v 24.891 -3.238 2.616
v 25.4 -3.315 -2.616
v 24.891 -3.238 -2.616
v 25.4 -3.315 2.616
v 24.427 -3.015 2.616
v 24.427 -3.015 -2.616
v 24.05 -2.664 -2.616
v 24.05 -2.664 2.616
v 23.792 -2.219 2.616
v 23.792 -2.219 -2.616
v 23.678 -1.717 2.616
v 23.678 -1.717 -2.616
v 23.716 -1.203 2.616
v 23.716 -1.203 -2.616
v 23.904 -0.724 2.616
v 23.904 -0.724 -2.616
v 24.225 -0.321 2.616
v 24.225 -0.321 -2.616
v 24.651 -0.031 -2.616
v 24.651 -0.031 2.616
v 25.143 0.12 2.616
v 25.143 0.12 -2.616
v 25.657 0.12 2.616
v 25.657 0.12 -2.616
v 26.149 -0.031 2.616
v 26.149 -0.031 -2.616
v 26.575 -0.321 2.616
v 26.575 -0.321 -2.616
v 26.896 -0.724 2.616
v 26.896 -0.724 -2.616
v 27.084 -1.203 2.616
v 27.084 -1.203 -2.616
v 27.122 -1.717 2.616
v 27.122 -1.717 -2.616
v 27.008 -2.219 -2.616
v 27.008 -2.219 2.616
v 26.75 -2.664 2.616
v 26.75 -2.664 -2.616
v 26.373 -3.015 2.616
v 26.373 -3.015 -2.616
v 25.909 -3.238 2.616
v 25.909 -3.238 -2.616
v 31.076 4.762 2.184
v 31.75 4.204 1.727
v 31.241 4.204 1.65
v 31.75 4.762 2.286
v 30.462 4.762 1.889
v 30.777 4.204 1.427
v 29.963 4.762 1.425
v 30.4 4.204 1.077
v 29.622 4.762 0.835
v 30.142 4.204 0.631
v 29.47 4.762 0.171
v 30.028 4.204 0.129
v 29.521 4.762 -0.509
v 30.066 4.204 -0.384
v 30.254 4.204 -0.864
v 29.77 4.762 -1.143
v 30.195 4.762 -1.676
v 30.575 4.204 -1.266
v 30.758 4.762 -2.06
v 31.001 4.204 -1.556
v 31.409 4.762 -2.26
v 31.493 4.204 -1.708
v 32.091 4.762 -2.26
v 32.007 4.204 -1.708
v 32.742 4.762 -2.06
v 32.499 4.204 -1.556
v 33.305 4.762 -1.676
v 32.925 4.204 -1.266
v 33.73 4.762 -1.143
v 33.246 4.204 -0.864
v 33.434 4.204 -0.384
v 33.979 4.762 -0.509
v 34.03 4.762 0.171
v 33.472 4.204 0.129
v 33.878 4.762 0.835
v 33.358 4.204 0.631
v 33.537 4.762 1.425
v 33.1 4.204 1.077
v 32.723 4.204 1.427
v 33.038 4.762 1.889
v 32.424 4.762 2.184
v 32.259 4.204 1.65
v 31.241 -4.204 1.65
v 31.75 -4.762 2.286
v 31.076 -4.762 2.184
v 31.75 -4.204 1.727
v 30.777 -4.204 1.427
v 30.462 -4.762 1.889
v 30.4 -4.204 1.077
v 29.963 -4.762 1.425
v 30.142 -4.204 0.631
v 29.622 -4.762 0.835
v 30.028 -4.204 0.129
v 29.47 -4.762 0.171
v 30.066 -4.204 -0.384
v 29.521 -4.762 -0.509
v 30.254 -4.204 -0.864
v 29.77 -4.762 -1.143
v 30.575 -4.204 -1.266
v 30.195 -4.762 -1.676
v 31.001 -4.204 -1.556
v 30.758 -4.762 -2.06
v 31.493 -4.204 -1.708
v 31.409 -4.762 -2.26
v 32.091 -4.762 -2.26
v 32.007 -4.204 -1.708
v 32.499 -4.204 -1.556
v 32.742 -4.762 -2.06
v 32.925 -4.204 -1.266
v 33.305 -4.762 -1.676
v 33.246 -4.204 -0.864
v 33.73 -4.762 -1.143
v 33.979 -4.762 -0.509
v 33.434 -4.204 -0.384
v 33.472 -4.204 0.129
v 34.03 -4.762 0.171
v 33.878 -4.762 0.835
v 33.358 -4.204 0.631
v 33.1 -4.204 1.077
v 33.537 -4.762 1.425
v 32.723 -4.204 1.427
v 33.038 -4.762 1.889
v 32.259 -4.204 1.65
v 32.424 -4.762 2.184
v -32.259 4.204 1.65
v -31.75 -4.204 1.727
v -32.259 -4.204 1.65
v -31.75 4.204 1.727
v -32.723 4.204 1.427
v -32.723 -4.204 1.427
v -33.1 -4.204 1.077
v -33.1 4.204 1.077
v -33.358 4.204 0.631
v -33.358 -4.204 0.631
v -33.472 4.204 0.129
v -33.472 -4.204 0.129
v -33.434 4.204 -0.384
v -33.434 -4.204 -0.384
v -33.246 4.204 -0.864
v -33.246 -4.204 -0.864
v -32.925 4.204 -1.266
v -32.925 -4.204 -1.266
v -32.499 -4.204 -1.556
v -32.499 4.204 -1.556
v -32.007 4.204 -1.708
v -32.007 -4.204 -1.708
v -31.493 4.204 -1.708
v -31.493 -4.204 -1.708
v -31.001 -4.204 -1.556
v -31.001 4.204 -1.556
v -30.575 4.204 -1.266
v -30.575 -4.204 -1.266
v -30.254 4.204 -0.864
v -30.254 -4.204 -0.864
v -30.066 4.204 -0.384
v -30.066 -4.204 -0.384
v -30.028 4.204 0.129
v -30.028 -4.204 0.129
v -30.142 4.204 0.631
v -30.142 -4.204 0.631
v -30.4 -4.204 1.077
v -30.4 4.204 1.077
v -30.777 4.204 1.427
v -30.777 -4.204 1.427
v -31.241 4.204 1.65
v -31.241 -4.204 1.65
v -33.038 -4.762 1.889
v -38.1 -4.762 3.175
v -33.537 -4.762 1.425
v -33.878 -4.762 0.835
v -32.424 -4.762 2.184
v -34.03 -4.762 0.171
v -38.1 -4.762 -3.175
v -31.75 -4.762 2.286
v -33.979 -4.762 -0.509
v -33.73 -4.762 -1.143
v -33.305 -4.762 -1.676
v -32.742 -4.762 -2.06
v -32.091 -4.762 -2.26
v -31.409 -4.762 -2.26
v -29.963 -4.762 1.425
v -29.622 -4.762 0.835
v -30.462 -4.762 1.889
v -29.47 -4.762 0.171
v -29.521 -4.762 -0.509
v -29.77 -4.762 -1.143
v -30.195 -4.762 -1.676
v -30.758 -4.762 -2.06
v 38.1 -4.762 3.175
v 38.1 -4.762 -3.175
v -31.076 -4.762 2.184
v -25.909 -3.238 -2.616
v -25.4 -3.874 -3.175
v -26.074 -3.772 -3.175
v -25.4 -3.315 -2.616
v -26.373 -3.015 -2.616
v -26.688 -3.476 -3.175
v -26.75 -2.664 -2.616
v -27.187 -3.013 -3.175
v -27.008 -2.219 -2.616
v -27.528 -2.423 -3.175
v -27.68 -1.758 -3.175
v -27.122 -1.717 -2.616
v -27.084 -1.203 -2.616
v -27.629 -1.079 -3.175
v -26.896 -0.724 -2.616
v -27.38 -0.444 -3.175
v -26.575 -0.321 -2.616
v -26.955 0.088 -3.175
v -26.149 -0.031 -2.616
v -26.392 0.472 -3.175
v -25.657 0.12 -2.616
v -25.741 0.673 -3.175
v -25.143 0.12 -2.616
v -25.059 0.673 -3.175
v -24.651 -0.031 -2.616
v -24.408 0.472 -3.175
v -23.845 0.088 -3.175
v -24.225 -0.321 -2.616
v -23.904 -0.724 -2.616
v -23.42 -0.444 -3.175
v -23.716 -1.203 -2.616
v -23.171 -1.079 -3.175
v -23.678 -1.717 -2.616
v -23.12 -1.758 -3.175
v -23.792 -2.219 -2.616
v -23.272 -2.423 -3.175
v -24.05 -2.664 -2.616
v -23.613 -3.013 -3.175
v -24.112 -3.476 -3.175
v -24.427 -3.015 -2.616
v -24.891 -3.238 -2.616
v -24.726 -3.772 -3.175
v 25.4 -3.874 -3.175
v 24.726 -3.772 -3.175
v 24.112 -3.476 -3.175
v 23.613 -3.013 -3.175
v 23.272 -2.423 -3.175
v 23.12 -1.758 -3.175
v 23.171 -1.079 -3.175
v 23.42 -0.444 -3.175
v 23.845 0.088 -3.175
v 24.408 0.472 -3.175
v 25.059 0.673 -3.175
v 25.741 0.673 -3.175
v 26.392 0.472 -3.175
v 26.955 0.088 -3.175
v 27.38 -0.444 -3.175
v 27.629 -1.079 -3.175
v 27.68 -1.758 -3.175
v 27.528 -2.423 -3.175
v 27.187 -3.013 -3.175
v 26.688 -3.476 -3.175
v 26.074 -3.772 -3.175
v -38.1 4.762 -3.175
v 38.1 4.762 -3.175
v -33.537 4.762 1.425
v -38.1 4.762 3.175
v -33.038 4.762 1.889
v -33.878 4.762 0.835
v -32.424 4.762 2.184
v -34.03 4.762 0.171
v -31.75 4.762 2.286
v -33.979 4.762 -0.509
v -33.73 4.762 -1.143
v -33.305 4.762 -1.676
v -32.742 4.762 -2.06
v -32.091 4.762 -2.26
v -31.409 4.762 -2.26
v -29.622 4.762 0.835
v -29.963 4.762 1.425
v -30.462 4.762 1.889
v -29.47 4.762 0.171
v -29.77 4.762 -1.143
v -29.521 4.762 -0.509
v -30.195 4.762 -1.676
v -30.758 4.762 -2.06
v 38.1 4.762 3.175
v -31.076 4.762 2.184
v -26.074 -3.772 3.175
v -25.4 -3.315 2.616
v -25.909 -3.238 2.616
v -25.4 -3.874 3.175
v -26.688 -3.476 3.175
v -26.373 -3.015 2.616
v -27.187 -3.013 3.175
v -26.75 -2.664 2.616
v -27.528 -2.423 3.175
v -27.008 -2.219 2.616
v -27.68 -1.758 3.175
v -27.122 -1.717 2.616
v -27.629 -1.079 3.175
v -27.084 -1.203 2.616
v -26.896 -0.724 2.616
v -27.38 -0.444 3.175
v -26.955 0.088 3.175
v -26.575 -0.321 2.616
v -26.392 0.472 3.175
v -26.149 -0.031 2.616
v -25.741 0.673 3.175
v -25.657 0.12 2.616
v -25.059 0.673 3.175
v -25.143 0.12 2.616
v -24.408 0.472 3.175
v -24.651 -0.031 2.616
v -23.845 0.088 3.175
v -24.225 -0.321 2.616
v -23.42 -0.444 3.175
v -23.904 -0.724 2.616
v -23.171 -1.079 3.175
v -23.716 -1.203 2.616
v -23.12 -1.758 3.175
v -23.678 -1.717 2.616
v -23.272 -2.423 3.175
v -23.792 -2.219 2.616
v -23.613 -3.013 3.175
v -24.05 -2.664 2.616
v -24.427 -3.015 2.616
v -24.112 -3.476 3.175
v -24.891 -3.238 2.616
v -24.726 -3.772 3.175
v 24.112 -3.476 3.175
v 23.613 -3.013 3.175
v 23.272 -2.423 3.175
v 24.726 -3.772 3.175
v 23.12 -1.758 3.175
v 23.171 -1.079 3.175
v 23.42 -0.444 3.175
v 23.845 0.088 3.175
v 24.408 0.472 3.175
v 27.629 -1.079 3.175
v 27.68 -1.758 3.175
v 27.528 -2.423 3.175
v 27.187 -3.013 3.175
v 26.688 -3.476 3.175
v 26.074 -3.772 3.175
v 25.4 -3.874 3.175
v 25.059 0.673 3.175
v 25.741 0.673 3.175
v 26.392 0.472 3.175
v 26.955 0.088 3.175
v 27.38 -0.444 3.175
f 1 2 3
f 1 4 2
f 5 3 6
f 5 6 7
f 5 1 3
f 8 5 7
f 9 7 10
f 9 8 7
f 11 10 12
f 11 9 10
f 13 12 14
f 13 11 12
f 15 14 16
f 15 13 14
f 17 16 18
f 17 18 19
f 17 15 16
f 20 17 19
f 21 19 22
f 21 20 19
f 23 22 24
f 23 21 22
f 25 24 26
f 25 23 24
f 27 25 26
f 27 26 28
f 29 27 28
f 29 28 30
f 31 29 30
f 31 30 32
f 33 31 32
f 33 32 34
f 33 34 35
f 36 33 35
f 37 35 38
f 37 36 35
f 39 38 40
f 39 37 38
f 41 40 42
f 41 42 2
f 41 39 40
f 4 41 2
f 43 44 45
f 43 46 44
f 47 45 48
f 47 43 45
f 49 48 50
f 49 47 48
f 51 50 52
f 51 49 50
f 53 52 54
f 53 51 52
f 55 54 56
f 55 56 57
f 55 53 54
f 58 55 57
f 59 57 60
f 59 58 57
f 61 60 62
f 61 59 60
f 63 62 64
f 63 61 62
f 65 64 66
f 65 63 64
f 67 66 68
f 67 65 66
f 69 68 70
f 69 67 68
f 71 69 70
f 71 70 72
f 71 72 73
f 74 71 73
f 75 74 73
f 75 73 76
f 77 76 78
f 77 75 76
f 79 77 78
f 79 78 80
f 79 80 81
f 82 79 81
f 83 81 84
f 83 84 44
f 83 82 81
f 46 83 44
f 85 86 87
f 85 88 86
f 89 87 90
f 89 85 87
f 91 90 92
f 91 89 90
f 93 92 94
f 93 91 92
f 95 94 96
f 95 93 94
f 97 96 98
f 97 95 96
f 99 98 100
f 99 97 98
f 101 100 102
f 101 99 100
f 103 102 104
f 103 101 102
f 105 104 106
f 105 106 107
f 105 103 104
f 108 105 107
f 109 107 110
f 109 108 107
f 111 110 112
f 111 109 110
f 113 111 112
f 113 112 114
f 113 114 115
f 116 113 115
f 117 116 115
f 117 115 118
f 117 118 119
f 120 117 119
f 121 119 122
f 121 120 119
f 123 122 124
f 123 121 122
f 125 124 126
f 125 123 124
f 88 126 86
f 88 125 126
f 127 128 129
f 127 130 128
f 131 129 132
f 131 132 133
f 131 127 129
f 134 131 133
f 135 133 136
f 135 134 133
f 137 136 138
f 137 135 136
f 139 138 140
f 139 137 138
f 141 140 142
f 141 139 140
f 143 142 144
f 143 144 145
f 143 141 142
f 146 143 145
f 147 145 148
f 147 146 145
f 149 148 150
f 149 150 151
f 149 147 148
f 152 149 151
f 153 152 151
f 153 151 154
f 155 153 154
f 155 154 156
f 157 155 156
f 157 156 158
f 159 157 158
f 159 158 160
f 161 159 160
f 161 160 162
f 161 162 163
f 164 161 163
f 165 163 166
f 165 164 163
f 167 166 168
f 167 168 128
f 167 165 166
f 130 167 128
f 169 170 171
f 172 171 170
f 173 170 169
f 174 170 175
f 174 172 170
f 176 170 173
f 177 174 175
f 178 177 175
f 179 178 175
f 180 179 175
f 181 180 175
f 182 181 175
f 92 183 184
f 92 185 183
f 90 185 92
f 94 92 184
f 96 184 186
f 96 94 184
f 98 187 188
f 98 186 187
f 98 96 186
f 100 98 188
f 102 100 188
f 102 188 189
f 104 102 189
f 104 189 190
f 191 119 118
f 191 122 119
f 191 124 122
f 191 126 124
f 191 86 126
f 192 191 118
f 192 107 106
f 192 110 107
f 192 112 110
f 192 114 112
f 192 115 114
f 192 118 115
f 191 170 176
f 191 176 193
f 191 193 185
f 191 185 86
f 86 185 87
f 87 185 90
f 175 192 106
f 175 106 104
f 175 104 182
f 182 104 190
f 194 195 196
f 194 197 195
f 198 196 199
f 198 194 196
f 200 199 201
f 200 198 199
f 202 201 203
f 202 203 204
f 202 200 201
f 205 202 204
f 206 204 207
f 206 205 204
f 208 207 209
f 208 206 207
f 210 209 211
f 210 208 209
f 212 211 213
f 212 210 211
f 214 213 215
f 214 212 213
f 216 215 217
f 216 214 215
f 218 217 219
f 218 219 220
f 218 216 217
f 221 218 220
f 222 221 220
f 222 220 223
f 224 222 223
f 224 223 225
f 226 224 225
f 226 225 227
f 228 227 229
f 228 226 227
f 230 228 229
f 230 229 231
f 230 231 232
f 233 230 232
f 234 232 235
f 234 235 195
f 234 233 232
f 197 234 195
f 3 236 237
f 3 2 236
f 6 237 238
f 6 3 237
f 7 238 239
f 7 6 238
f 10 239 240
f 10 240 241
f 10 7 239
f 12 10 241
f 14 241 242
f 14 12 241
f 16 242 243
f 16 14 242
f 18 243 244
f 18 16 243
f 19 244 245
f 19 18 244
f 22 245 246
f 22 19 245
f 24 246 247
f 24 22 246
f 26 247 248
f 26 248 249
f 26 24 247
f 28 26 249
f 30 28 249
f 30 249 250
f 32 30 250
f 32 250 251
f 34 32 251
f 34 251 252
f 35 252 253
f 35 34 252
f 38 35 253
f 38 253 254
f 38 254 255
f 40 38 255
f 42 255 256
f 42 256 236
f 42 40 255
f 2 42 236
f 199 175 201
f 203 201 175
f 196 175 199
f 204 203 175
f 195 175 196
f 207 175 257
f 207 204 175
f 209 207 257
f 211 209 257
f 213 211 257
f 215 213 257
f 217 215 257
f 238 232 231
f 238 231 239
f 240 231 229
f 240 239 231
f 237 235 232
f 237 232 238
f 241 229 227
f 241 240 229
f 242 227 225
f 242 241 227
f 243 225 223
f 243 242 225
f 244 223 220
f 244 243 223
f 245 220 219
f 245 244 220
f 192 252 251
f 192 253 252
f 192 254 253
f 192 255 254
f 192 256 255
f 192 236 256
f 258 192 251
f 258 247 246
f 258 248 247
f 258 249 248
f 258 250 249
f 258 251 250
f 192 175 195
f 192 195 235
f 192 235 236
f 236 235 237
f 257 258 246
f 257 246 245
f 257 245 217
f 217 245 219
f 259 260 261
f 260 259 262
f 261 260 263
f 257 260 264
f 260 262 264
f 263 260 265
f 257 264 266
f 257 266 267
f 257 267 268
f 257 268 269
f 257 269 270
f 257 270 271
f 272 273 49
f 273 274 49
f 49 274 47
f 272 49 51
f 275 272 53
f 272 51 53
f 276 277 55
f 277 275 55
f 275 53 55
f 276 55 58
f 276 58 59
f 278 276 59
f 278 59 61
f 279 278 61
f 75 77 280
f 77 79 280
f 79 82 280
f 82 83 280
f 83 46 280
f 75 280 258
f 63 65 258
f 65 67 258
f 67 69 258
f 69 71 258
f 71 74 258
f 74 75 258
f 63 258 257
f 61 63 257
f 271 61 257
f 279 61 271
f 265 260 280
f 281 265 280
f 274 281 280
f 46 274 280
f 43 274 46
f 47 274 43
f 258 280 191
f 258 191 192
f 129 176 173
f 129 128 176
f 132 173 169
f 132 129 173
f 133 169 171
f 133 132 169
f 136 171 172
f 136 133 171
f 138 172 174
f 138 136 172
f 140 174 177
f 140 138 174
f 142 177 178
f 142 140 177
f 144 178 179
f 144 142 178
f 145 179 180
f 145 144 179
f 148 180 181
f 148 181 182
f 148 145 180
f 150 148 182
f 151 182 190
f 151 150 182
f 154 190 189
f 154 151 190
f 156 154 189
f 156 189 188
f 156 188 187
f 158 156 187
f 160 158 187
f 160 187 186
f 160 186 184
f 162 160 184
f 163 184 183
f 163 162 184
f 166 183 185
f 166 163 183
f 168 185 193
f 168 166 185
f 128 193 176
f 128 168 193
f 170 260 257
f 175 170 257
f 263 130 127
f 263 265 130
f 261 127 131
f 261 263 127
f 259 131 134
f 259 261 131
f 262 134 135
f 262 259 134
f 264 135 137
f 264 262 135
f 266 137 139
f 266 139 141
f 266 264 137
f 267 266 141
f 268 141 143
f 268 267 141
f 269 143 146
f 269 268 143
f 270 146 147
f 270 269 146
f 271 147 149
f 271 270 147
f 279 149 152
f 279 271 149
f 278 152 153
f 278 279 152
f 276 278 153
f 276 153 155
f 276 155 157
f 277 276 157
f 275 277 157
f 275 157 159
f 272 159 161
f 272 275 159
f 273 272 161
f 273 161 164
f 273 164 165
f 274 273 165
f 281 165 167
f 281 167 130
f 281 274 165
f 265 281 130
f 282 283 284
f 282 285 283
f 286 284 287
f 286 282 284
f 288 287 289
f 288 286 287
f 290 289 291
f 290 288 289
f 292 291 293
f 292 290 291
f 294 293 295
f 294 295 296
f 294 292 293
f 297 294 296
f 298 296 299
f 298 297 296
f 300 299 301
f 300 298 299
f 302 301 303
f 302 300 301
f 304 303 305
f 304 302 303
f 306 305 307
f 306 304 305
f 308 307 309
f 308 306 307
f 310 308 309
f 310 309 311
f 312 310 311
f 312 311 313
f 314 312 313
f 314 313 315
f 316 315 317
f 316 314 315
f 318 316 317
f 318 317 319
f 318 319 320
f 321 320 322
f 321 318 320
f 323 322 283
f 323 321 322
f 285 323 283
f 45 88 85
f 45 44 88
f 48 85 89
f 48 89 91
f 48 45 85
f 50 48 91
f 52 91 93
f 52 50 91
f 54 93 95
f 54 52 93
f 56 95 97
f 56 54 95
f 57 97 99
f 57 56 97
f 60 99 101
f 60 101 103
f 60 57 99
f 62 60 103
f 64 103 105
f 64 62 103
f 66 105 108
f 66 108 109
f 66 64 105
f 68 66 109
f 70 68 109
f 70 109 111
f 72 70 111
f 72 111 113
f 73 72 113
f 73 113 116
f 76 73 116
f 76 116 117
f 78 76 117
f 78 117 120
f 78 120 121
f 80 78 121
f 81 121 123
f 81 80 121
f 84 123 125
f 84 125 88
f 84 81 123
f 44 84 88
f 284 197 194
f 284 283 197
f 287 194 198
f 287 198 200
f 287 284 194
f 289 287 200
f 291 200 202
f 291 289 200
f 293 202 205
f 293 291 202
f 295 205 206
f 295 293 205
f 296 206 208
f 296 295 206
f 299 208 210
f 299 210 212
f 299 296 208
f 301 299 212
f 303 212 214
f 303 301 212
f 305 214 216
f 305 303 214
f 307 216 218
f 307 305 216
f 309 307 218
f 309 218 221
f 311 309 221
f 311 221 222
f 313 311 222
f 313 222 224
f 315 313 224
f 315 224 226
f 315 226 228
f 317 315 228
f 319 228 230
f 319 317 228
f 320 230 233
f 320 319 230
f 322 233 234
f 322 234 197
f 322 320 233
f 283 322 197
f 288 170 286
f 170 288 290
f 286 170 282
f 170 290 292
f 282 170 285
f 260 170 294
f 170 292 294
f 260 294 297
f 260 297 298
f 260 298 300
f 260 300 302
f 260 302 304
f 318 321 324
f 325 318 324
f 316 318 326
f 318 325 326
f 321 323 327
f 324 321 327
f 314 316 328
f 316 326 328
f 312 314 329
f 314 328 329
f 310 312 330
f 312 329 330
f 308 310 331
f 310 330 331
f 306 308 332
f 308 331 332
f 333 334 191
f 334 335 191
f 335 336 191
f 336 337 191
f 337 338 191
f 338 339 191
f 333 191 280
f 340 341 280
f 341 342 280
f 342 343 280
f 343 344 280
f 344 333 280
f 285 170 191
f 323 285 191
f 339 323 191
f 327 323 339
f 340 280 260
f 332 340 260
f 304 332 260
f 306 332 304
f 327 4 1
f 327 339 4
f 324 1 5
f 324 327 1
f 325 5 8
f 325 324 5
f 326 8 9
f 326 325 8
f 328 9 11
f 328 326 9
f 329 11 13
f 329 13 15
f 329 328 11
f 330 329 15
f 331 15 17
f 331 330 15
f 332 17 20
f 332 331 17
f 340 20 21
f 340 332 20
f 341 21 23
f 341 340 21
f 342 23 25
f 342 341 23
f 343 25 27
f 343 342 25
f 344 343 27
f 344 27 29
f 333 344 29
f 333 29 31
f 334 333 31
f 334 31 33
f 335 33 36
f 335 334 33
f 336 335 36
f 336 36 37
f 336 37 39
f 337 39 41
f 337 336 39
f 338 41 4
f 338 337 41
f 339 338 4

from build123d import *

# Parameters (mm, degrees)
SKETCH1_W                      = 6.35
SKETCH1_H                      = 9.525
BOSS_EXTRUDE1_DEPTH            = 38.1
F_8_32_TAPPED_HOLE1_AT_2_COUNT = 2
F_8_32_TAPPED_HOLE1_AT_2_PITCH = 63.5
F_8_32_TAPPED_HOLE2_AT_2_COUNT = 2
F_8_32_TAPPED_HOLE2_AT_2_PITCH = 50.8


with BuildPart() as part:
    # Sketch1 → Boss-Extrude1 (new, symmetric)
    with BuildSketch(Plane(origin=(0, 0, 0), x_dir=(0, 0, -1), z_dir=(1, 0, 0))):
        Rectangle(SKETCH1_W, SKETCH1_H)
    extrude(amount=BOSS_EXTRUDE1_DEPTH, both=True)

    # Sketch2 → #8-32 Tapped Hole1 (revolve, cut)
    with BuildSketch(Plane(origin=(31.75, 4.7625, 0), x_dir=(0, 0, 1), z_dir=(1, 0, 0))):
        Polygon((0, 0), (0, 9.525), (2.286, 9.525), (1.7272, 8.9662), (1.7272, 0.5588), (2.286, 0), align=None)
    f_8_32_tapped_hole1 = revolve(axis=Axis((31.75, 11.1125, 0), (0, -1, 0)), mode=Mode.SUBTRACT)

    # #8-32 Tapped Hole1 at 2: #8-32 Tapped Hole1 ×2
    with Locations(*[(-i * F_8_32_TAPPED_HOLE1_AT_2_PITCH, 0, 0) for i in range(1, F_8_32_TAPPED_HOLE1_AT_2_COUNT)]):
        add(f_8_32_tapped_hole1, mode=Mode.SUBTRACT)

    # Sketch4 → #8-32 Tapped Hole2 (revolve, cut)
    with BuildSketch(Plane(origin=(25.4, -1.5875, 3.175), x_dir=(0, -1, 0), z_dir=(1, 0, 0))):
        Polygon((0, 0), (0, 6.35), (2.286, 6.35), (1.7272, 5.7912), (1.7272, 0.5588), (2.286, 0), align=None)
    f_8_32_tapped_hole2 = revolve(axis=Axis((25.4, -1.5875, 9.525), (0, 0, -1)), mode=Mode.SUBTRACT)

    # #8-32 Tapped Hole2 at 2: #8-32 Tapped Hole2 ×2
    with Locations(*[(-i * F_8_32_TAPPED_HOLE2_AT_2_PITCH, 0, 0) for i in range(1, F_8_32_TAPPED_HOLE2_AT_2_COUNT)]):
        add(f_8_32_tapped_hole2, mode=Mode.SUBTRACT)


solid = part.part
